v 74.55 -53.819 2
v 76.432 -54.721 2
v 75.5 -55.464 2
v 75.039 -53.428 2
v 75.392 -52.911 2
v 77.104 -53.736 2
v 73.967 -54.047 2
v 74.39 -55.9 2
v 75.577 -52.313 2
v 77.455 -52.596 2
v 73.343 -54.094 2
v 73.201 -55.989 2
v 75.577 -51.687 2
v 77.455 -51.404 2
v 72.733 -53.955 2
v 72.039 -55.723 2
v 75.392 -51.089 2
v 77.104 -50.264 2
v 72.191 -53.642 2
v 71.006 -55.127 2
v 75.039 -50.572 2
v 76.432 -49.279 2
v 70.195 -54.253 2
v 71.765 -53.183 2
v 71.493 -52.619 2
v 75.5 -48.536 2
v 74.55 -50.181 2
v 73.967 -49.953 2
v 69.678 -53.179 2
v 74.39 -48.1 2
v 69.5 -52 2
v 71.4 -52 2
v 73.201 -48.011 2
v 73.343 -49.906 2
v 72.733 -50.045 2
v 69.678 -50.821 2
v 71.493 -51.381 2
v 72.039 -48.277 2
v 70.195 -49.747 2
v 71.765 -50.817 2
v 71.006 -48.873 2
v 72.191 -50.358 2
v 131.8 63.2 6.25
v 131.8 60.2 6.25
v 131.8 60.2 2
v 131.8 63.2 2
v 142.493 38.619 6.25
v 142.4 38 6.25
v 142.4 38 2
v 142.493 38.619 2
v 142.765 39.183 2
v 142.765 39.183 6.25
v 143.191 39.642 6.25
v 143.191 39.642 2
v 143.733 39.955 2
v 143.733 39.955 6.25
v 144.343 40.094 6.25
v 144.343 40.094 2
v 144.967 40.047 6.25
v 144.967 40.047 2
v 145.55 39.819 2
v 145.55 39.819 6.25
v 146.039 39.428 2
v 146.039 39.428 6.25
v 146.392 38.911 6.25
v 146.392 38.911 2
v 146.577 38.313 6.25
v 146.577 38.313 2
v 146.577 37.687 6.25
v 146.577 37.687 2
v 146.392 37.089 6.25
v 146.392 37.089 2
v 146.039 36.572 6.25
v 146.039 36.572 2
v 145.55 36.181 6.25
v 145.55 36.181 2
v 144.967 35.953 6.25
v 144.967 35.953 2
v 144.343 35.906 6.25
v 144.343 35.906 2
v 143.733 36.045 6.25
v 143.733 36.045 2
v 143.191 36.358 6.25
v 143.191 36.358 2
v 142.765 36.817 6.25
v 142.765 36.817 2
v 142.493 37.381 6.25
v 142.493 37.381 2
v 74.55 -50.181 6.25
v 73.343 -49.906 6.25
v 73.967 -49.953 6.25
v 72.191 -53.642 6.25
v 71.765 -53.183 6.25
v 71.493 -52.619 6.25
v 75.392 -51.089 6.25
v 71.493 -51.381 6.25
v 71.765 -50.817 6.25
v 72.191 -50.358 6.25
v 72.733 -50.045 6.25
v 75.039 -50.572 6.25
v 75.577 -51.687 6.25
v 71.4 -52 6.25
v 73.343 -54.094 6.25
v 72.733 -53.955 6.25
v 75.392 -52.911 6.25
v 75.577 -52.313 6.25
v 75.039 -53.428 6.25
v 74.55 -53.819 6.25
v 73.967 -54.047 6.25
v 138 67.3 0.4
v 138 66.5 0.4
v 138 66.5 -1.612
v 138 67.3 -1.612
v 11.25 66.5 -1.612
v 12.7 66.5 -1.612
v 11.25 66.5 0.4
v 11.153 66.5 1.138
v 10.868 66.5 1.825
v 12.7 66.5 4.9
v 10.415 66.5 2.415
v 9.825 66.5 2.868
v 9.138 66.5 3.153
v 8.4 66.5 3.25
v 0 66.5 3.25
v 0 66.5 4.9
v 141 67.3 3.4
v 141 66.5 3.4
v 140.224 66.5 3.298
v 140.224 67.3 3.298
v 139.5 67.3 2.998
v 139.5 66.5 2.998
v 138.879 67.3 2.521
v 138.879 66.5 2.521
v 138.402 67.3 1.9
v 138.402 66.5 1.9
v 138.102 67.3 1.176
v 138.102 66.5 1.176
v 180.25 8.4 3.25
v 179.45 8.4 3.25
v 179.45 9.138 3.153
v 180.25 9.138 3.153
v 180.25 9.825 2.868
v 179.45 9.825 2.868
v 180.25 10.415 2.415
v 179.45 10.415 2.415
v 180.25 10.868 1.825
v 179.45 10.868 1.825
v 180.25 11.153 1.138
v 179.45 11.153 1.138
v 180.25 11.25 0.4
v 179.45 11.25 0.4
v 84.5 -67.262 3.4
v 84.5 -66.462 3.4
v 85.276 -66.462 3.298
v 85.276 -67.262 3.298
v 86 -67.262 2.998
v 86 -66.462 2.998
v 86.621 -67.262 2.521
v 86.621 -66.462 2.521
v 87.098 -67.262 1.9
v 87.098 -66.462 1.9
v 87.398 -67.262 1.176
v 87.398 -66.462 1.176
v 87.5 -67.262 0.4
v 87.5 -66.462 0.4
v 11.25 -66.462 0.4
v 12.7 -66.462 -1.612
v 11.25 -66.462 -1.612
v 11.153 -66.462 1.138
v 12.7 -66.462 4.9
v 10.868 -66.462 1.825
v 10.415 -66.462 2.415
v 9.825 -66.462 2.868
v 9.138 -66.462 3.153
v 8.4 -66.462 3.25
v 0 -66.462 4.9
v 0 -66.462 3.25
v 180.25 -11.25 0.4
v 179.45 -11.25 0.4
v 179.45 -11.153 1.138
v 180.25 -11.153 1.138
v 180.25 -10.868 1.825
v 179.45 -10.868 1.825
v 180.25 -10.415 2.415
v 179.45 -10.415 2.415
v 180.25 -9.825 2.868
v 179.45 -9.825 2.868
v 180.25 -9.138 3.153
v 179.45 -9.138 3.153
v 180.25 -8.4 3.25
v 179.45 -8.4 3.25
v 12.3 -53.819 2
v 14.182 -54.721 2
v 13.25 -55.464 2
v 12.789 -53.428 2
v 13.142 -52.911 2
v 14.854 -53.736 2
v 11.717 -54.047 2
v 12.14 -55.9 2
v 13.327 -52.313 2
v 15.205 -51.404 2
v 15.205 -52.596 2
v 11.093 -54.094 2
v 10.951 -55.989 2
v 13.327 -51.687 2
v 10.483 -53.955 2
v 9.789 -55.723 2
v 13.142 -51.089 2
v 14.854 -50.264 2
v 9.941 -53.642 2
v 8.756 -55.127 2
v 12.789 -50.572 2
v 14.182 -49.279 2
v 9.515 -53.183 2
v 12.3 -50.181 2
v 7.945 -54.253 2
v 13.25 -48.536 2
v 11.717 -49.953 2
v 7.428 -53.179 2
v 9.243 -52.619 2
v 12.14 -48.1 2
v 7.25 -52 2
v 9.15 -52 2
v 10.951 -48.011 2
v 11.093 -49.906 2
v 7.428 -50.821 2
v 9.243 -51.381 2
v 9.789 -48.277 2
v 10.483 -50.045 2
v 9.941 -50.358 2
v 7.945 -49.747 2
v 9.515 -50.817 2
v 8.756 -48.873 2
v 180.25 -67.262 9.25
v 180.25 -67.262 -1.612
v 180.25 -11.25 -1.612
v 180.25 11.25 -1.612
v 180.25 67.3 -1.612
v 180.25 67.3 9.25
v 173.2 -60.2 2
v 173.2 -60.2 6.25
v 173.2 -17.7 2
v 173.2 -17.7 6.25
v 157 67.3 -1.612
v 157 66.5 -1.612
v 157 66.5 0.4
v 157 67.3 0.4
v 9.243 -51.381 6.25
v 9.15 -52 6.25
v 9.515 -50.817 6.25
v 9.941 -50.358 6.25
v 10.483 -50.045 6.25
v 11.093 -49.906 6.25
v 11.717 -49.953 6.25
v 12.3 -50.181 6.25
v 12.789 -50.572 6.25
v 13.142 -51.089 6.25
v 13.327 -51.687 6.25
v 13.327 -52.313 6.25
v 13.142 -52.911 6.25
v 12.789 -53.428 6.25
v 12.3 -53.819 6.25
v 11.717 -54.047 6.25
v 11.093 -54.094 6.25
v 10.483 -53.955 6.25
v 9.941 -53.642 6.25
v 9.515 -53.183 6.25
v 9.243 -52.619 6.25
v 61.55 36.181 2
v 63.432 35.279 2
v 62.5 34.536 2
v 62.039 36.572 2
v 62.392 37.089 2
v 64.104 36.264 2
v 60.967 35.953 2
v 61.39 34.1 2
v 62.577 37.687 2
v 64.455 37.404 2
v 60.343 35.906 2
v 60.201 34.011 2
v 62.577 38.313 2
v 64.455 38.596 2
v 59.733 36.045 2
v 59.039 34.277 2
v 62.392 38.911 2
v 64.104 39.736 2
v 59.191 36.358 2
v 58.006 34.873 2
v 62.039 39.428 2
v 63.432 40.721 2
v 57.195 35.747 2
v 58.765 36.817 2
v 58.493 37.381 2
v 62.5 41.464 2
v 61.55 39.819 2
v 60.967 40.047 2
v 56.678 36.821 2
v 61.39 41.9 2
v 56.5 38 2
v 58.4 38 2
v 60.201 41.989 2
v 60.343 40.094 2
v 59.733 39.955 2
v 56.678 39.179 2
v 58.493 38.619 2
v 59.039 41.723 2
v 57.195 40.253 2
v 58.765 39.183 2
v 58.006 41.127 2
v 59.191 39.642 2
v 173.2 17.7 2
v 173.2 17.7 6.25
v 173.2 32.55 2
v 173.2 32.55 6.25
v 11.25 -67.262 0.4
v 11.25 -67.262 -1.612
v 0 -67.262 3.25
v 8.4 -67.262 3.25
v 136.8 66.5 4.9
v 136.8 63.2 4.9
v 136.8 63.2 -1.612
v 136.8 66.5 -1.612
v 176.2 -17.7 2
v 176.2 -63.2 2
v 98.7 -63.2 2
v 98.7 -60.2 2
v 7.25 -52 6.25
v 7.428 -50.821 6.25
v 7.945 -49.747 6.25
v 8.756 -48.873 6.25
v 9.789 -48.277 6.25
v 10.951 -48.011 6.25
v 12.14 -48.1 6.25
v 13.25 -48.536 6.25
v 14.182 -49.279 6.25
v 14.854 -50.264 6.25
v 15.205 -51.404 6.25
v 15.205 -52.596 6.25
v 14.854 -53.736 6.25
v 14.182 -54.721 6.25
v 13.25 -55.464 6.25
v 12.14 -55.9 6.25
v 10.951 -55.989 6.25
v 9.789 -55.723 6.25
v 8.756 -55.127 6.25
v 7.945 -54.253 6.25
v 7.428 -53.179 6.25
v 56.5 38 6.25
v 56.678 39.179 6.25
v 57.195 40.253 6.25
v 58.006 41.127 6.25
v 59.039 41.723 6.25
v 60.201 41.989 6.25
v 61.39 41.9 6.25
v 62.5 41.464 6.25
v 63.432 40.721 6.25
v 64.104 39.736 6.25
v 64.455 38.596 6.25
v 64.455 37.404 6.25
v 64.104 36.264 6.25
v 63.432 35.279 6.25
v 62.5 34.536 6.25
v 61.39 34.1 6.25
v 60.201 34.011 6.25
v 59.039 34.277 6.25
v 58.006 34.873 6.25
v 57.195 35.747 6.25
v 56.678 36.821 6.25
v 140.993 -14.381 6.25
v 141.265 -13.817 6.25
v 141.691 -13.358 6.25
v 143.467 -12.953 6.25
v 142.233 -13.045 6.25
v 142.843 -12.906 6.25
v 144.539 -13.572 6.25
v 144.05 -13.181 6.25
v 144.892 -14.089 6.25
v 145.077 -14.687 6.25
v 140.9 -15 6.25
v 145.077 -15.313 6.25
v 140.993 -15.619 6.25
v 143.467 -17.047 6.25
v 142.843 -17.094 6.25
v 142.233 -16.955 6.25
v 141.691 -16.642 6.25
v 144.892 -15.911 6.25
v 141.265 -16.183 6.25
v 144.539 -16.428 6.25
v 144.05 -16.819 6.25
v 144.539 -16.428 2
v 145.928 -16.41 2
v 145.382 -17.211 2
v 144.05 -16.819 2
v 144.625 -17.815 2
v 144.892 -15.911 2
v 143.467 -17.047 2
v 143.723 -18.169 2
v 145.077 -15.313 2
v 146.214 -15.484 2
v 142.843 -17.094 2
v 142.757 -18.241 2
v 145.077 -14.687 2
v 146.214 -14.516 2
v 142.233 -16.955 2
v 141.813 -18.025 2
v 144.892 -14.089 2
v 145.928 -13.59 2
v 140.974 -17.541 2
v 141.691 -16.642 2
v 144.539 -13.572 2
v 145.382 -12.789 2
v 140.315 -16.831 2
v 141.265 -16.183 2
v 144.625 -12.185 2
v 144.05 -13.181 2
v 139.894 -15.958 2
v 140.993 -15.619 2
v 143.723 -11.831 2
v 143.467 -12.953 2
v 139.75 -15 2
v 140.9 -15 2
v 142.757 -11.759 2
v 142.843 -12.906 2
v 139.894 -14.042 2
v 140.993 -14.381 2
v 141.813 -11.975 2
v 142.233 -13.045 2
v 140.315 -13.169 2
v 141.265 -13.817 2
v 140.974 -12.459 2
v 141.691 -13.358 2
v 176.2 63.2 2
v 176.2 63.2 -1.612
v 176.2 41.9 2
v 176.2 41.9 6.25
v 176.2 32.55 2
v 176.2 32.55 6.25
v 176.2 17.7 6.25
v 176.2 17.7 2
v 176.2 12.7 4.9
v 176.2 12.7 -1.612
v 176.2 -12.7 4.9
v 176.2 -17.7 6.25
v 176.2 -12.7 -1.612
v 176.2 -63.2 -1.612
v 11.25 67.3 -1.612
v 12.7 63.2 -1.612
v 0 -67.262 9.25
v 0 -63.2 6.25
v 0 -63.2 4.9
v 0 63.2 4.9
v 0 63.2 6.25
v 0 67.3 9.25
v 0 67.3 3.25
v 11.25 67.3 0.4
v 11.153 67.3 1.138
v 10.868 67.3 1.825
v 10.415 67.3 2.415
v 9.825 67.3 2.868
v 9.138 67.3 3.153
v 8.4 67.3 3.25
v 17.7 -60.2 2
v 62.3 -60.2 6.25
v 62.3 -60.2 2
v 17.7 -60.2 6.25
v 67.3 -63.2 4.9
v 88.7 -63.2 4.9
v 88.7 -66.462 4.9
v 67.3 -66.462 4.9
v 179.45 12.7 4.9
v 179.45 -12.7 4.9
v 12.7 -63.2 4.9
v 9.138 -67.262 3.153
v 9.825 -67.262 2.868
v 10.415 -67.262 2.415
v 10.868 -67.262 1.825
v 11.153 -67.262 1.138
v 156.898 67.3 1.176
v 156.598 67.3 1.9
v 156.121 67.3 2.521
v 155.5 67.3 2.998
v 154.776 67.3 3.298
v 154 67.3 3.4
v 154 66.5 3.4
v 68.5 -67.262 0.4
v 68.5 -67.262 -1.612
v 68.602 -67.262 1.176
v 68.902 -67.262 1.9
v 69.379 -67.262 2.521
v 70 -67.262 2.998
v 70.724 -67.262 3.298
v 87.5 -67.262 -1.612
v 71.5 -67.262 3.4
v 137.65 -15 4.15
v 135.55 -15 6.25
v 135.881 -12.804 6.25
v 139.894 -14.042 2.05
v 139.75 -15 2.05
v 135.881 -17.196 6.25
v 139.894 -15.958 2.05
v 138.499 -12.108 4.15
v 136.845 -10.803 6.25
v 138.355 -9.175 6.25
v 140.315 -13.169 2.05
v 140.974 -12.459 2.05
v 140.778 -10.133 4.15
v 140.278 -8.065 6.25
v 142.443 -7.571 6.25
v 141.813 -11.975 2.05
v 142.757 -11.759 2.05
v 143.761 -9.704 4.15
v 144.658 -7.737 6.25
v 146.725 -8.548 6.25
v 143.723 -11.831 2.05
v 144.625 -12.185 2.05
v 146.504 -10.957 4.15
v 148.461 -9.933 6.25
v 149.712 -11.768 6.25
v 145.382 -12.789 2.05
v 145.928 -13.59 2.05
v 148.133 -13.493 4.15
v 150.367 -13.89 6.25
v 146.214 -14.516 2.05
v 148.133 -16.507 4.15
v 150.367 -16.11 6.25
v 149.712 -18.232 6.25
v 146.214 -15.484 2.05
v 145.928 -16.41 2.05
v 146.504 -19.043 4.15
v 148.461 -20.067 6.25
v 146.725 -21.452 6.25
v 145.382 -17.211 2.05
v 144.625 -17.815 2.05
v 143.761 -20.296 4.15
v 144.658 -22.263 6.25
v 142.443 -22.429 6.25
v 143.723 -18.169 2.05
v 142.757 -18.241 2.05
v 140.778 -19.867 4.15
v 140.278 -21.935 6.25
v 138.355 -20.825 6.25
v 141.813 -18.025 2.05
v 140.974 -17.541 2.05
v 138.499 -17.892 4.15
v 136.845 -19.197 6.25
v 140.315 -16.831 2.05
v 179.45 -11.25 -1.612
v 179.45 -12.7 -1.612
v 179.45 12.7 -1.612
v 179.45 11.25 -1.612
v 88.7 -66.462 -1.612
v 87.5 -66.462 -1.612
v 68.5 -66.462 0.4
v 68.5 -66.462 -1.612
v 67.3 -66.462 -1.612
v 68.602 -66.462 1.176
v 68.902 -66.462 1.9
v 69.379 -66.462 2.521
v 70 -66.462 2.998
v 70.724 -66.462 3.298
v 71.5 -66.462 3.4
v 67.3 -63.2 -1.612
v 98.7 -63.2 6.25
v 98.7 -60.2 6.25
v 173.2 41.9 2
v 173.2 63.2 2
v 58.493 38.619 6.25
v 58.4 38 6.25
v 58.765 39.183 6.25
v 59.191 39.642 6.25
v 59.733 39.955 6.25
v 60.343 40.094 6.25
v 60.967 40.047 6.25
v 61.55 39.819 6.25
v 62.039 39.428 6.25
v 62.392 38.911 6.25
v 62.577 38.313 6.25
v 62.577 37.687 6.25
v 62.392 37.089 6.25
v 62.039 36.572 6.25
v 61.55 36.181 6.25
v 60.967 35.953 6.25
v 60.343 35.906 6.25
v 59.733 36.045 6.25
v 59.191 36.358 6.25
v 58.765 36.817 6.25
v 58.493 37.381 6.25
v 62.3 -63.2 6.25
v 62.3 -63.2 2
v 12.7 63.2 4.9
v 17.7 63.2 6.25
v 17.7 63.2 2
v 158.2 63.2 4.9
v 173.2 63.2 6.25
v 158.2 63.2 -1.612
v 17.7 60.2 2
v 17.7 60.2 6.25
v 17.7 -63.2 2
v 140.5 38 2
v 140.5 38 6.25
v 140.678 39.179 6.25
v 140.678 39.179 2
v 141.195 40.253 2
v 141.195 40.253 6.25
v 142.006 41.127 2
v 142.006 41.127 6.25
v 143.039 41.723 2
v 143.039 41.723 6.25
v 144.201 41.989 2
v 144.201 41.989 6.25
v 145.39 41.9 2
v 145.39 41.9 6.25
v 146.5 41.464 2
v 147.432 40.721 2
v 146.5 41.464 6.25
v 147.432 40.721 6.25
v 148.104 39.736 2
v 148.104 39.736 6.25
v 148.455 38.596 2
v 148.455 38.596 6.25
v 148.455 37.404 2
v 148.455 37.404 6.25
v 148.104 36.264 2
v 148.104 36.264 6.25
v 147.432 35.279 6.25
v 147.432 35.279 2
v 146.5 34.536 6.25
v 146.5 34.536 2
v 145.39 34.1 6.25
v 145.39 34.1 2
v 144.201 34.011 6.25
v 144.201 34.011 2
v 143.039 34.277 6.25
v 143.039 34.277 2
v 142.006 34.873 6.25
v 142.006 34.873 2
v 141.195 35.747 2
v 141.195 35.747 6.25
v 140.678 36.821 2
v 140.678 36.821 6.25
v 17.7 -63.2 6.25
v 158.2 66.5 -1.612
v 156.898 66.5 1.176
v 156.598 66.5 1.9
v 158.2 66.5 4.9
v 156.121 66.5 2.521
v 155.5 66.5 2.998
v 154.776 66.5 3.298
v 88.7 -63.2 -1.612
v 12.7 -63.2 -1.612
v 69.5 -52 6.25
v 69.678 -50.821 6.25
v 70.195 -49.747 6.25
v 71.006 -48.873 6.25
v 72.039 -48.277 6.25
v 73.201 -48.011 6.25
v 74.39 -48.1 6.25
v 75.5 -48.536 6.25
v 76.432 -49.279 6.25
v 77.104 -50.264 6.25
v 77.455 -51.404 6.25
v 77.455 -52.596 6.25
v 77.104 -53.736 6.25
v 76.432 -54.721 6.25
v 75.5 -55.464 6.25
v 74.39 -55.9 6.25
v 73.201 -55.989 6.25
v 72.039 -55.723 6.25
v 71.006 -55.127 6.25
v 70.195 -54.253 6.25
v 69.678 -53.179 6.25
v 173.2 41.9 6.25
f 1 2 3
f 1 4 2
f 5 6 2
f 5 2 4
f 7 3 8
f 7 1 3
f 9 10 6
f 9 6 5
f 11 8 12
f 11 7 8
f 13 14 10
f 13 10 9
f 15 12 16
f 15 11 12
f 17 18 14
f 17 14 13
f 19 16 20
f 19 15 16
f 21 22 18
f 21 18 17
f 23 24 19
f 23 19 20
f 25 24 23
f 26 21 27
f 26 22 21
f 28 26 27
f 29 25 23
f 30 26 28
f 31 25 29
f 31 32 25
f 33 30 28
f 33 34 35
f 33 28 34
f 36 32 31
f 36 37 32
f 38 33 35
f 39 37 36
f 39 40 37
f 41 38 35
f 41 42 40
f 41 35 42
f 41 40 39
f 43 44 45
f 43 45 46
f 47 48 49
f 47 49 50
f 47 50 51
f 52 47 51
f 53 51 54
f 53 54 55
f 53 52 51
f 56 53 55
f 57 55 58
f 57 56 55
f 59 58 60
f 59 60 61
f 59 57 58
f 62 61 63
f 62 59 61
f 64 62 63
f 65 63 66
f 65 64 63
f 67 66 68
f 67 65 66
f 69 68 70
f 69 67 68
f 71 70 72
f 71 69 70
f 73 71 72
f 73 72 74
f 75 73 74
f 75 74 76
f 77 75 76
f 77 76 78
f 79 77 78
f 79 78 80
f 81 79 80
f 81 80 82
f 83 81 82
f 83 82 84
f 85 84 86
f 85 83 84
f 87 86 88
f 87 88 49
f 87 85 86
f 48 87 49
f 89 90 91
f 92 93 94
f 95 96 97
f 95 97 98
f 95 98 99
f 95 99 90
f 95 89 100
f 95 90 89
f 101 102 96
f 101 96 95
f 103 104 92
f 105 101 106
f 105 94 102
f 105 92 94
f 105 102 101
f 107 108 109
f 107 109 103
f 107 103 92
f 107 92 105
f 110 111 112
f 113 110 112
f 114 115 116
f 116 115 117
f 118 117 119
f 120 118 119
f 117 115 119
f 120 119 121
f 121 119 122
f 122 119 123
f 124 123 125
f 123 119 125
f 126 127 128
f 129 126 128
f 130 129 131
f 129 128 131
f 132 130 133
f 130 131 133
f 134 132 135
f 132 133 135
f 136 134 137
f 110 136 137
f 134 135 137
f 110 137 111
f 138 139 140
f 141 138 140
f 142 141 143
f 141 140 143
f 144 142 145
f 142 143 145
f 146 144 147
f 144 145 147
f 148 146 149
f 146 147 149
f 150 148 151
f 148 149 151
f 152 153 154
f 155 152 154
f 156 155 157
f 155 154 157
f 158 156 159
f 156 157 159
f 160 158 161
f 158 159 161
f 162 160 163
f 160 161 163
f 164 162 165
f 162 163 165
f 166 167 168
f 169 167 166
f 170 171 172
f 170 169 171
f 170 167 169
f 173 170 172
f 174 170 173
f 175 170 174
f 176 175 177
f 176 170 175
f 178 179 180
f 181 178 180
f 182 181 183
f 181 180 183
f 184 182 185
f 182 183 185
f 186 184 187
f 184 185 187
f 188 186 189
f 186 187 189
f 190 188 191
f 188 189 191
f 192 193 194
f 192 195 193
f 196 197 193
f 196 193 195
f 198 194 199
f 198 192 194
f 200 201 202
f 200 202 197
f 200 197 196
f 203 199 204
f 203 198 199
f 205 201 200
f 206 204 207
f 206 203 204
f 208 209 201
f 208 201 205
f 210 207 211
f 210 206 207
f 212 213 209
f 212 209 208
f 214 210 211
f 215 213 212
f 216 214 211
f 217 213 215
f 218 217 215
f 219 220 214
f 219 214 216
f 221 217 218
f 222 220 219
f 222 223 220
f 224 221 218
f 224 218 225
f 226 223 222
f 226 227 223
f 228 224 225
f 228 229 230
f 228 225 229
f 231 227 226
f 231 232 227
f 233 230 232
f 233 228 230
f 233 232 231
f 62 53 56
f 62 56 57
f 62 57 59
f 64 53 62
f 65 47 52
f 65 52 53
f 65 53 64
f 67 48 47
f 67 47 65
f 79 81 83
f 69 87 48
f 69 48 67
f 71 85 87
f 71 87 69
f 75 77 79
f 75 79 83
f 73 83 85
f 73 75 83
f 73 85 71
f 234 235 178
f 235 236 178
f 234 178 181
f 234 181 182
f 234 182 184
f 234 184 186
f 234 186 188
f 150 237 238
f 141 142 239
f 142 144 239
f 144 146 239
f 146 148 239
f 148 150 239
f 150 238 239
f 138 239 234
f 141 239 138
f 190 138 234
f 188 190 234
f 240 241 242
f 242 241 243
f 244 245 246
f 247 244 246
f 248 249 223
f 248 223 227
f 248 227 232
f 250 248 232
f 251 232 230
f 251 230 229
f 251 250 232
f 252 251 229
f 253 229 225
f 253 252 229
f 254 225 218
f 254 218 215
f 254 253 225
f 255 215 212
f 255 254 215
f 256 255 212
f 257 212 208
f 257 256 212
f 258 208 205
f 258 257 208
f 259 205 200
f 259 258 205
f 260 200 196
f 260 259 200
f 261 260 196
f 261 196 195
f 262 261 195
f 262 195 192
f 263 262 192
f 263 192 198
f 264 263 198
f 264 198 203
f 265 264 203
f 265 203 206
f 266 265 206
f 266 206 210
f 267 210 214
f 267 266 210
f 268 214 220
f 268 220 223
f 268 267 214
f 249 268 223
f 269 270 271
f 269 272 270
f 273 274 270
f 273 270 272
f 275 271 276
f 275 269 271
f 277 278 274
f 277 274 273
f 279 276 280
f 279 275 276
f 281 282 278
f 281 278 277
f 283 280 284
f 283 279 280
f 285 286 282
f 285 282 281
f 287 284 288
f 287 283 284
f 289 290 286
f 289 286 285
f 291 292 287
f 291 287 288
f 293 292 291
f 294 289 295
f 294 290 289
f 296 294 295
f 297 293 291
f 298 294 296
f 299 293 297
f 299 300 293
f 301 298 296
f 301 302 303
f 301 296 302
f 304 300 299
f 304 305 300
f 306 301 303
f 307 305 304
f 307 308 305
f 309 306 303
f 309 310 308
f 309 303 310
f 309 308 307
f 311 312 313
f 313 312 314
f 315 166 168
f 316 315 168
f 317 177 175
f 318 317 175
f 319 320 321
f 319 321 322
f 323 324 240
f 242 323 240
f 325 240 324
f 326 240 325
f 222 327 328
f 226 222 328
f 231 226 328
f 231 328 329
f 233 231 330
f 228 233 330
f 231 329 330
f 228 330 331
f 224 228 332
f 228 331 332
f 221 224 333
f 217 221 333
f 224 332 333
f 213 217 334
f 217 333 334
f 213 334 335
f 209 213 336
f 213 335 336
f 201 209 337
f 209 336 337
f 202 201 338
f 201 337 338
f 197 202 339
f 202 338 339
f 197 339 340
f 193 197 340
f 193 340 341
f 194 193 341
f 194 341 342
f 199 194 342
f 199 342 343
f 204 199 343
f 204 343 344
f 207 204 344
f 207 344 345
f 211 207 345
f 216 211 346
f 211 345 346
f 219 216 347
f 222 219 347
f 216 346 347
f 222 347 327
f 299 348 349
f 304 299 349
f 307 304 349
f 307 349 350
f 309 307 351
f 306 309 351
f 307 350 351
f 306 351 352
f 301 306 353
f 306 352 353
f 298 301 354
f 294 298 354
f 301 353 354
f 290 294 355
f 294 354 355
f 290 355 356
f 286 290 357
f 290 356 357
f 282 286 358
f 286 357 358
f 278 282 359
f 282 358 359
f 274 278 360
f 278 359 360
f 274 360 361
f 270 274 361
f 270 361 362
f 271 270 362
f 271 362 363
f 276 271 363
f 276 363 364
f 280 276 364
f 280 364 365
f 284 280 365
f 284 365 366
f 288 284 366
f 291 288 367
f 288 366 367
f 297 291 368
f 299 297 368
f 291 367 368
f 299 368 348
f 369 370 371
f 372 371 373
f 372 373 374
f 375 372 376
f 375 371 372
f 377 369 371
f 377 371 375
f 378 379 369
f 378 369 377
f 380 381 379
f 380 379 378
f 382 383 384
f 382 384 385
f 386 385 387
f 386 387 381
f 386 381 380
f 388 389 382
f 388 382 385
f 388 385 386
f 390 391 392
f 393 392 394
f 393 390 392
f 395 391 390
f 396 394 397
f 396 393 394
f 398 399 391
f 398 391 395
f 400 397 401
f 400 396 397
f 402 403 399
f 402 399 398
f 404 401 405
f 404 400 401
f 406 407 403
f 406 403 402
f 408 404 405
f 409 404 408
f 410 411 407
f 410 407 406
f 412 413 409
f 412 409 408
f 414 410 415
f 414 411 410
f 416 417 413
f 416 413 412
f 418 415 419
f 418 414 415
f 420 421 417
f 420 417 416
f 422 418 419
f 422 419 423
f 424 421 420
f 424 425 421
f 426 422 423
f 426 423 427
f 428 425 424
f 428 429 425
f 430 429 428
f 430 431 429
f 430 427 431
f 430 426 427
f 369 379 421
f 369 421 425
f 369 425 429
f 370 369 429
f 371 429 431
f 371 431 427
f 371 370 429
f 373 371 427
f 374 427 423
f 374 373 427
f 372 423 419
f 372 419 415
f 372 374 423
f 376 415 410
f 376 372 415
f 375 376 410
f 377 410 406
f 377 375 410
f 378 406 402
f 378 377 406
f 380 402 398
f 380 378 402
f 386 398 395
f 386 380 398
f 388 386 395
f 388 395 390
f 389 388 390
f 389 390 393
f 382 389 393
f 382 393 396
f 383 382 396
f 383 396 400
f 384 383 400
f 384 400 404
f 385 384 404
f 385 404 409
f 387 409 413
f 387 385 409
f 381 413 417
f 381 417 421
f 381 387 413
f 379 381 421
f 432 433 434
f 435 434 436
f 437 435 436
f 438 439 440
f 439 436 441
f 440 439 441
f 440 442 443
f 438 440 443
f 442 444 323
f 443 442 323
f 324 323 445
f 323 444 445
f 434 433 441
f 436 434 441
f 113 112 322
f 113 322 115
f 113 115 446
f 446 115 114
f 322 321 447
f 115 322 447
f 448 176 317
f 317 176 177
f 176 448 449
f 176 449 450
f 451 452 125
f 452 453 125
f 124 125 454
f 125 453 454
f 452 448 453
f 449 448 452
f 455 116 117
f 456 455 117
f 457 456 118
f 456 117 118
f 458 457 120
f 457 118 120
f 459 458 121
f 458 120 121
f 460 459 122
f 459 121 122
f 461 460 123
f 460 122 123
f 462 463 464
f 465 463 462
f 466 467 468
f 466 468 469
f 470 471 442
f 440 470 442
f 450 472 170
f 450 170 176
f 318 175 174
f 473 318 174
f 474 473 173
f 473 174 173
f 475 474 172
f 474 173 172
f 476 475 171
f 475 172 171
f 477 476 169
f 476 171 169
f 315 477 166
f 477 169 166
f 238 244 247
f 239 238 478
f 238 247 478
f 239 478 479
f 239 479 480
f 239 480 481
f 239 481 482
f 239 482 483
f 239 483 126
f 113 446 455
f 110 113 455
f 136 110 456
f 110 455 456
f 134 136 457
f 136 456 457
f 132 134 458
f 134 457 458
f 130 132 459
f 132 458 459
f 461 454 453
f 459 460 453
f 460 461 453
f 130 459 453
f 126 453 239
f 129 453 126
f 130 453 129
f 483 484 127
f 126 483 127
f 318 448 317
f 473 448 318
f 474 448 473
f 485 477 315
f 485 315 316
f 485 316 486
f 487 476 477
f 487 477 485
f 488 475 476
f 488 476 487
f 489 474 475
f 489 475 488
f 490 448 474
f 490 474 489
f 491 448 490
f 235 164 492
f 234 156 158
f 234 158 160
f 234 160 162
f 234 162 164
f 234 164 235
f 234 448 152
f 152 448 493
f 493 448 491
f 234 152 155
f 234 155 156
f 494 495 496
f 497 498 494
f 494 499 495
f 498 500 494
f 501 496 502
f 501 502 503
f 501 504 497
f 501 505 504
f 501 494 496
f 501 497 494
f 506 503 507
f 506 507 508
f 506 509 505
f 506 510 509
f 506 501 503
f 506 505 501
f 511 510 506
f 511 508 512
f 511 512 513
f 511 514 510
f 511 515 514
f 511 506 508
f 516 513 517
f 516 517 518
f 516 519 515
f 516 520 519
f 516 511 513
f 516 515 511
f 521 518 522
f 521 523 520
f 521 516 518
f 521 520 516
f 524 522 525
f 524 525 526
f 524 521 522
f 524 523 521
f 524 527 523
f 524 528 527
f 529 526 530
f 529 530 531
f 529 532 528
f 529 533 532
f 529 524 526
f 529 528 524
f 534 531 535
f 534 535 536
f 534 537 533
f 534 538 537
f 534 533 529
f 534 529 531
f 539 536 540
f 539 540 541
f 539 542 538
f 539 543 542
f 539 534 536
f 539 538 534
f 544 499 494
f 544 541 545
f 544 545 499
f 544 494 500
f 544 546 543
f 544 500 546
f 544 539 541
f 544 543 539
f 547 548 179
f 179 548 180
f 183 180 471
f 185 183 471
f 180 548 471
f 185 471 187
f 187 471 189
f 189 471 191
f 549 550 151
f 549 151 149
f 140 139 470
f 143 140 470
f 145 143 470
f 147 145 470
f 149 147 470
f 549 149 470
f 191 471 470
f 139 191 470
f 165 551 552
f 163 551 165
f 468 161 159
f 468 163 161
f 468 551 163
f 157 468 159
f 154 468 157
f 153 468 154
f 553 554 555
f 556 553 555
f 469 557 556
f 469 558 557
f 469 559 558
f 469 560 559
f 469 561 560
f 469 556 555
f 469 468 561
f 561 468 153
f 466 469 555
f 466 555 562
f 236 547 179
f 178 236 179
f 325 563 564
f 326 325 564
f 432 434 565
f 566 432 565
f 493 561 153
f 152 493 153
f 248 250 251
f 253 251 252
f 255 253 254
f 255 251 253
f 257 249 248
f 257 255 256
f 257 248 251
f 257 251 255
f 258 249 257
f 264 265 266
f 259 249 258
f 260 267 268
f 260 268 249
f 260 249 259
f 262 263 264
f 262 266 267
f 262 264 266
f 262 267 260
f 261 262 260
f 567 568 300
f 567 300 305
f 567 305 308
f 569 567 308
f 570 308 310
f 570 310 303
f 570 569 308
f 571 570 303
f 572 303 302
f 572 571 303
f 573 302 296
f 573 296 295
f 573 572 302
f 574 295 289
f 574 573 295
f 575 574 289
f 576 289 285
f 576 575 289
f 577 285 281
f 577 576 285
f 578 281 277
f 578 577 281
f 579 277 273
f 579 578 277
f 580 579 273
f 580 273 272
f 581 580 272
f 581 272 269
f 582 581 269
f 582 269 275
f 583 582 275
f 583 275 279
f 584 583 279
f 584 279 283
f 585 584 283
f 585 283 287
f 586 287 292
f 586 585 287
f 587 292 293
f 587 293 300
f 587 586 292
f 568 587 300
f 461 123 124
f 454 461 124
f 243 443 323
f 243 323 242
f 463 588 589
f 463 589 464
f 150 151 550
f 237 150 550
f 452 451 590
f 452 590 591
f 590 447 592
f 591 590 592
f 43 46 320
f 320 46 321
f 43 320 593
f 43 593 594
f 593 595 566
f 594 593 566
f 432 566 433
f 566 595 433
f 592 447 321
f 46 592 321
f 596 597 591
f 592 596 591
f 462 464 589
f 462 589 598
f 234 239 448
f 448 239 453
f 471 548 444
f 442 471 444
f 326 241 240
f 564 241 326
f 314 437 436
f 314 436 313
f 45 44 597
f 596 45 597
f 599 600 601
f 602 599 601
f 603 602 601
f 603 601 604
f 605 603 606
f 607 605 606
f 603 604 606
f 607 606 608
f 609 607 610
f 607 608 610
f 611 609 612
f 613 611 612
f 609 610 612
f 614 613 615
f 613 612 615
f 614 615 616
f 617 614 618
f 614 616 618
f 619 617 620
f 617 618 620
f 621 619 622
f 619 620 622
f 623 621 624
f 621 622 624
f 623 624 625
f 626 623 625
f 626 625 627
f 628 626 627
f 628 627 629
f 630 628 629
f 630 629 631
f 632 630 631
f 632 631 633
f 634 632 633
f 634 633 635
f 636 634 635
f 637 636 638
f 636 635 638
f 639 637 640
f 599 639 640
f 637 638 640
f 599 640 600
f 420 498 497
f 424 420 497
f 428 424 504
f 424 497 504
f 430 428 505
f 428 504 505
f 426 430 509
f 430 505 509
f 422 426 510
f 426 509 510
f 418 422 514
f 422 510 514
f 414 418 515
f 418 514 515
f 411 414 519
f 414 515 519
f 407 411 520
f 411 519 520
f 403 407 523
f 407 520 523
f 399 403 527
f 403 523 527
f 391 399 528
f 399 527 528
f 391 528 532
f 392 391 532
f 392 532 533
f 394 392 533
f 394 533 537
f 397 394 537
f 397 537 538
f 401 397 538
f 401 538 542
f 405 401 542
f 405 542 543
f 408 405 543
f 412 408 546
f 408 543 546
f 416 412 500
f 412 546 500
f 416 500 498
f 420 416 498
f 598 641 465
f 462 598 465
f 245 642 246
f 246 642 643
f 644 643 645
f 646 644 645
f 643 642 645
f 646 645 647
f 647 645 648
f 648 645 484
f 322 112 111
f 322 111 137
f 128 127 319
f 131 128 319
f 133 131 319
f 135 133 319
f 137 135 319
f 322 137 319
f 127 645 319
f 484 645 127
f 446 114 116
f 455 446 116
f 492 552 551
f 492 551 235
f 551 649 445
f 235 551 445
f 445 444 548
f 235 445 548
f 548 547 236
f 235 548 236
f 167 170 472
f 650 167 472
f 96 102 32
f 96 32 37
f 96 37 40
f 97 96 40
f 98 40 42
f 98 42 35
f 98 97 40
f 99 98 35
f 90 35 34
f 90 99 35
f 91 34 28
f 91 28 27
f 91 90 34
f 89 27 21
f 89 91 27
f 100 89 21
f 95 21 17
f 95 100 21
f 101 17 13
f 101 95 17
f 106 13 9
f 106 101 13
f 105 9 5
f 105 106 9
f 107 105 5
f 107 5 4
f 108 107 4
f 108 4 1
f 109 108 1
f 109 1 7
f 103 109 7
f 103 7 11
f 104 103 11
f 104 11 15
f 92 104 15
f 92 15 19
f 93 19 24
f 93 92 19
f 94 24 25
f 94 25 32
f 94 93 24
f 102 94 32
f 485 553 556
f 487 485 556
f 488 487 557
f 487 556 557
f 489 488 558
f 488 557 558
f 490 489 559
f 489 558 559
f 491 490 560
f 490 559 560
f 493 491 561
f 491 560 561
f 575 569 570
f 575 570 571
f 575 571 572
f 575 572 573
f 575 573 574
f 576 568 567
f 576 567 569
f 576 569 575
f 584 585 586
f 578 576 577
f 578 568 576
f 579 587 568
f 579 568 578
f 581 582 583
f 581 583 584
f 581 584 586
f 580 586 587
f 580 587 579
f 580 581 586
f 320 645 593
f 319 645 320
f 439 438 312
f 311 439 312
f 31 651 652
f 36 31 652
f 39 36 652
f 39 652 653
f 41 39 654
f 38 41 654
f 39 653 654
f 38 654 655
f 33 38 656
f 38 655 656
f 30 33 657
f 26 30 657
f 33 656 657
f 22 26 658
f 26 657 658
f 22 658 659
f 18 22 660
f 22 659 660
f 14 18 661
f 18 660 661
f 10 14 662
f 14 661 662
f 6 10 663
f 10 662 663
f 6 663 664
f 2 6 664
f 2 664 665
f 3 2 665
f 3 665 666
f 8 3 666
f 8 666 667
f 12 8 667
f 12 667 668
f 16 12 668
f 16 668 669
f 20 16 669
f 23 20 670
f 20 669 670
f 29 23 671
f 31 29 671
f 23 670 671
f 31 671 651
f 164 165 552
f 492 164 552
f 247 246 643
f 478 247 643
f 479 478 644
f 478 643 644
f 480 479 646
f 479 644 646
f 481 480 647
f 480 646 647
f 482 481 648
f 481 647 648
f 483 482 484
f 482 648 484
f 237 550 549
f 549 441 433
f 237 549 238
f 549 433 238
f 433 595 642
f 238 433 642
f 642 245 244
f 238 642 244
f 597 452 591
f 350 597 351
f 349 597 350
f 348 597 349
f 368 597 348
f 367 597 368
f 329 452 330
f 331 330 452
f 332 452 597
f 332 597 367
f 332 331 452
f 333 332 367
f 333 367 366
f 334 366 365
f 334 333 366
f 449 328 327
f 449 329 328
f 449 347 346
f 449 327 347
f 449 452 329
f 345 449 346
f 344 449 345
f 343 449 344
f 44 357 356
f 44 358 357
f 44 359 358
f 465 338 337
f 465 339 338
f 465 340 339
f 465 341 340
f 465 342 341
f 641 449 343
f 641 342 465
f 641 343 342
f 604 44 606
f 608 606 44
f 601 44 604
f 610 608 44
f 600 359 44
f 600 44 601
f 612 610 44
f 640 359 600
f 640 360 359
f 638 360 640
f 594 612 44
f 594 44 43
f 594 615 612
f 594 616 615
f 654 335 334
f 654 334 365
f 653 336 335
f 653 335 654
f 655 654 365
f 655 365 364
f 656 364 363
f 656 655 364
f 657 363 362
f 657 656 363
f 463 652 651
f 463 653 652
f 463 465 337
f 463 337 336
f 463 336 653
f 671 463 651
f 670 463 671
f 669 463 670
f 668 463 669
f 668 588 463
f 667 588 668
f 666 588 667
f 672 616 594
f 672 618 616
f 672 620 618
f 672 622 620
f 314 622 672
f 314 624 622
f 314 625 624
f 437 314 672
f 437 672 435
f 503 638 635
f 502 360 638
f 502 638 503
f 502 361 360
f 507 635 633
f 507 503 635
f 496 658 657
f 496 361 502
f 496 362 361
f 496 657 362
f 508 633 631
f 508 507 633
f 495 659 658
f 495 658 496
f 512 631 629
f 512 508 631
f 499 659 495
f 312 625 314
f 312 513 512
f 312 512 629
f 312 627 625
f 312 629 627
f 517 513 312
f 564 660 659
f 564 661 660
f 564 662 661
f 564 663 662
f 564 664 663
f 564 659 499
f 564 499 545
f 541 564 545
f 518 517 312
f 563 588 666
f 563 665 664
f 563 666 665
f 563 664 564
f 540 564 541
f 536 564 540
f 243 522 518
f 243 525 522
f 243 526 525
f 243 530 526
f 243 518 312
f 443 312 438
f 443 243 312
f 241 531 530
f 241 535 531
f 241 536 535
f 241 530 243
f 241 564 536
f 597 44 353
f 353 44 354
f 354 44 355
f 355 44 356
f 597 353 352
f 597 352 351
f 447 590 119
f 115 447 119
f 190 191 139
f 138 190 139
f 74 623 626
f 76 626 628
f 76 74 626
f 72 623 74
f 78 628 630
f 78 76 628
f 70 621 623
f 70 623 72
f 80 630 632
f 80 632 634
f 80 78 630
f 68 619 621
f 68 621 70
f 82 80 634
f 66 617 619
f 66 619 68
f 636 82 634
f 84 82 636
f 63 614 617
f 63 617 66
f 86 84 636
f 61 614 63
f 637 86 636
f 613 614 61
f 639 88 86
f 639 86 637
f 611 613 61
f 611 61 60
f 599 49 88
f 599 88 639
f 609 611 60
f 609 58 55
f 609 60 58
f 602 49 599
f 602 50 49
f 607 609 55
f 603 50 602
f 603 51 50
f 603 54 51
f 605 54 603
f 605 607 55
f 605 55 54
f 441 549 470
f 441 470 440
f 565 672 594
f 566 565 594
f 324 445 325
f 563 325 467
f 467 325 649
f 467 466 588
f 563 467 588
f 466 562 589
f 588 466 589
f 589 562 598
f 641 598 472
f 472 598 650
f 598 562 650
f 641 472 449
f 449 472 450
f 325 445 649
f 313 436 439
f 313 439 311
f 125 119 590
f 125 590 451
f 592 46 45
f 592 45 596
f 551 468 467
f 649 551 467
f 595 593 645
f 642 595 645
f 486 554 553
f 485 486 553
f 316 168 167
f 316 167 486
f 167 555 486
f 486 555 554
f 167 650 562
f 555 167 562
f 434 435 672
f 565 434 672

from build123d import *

# Parameters (mm, degrees)
BOSS_EXTRUDE1_START  = 3.25
SKETCH1_W            = 176
SKETCH1_H            = 126
BOSS_EXTRUDE1_DEPTH  = 6
CUT_EXTRUDE1_START   = 3.25
SKETCH1_2_W          = 176
SKETCH1_2_H          = 126
CUT_EXTRUDE1_DEPTH   = 3
BOSS_EXTRUDE2_DEPTH  = 2.6
BOSS_EXTRUDE3_DEPTH  = 0.7
BOSS_EXTRUDE4_START  = 3.3
BOSS_EXTRUDE4_DEPTH  = 1
BOSS_EXTRUDE5_DEPTH  = 2.55
BOSS_EXTRUDE6_DEPTH  = 0.7
BOSS_EXTRUDE7_START  = 3.25
BOSS_EXTRUDE7_DEPTH  = 1
BOSS_EXTRUDE8_START  = 2.5625
BOSS_EXTRUDE8_DEPTH  = 2.5625
BOSS_EXTRUDE9_START  = 0.7
BOSS_EXTRUDE9_DEPTH  = 0.7
BOSS_EXTRUDE10_START = 3.2625
BOSS_EXTRUDE10_DEPTH = 1
CUT_EXTRUDE2_START   = -6.5116
SKETCH8_W            = 21.4
SKETCH8_H            = 3.5
SKETCH8_W_2          = 12.7
SKETCH8_W_3          = 3.45
SKETCH8_H_2          = 25.4
SKETCH8_H_3          = 3.4625
CUT_EXTRUDE2_DEPTH   = 6.5116
CUT_EXTRUDE3_REACH   = 194.71
SKETCH9_W            = 176
SKETCH9_H            = 0.2
SKETCH10_R           = 4
SKETCH10_R_2         = 2.1
SKETCH10_R_3         = 3.25
BOSS_EXTRUDE11_DEPTH = 4.25
SKETCH11_W           = 114.1
SKETCH11_H           = 3
SKETCH11_W_2         = 3
SKETCH11_H_2         = 21.3
SKETCH11_H_3         = 14.85
SKETCH11_H_4         = 42.5
SKETCH11_W_3         = 74.5
SKETCH11_W_4         = 44.6
BOSS_EXTRUDE12_DEPTH = 4.25
CHAMFER1_SIZE        = 4.2


with BuildPart() as part:
    # Sketch1 → Boss-Extrude1 (new body)
    with BuildSketch(Plane.XY.offset(BOSS_EXTRUDE1_START)):
        with Locations((88, 0)):
            Rectangle(SKETCH1_W, SKETCH1_H)
    extrude(amount=BOSS_EXTRUDE1_DEPTH)

    # Sketch1<2> → Cut-Extrude1 (cut)
    with BuildSketch(Plane.XY.offset(CUT_EXTRUDE1_START)):
        with Locations((88, 0)):
            Rectangle(SKETCH1_2_W, SKETCH1_2_H)
    extrude(amount=CUT_EXTRUDE1_DEPTH, mode=Mode.SUBTRACT)

    # Sketch2 → Boss-Extrude2 (add)
    with BuildSketch(Plane(origin=(0, 63, 0), x_dir=(1, 0, 0), z_dir=(0, 1, 0))):
        with BuildLine():
            Line((0, -3.25), (0, -9.25))
            Line((0, -9.25), (176, -9.25))
            Line((176, -9.25), (176, 1.6116))
            Line((176, 1.6116), (157, 1.6116))
            Line((157, 1.6116), (157, -0.4))
            ThreePointArc((157, -0.4), (156.121320344, -2.521320344), (154, -3.4))
            Line((154, -3.4), (141, -3.4))
            ThreePointArc((141, -3.4), (138.878679656, -2.521320344), (138, -0.4))
            Line((138, -0.4), (138, 1.6116))
            Line((138, 1.6116), (11.25, 1.6116))
            Line((11.25, 1.6116), (11.25, -0.4))
            ThreePointArc((11.25, -0.4), (10.415254326, -2.415254326), (8.4, -3.25))
            Line((8.4, -3.25), (0, -3.25))
        make_face()
    extrude(amount=BOSS_EXTRUDE2_DEPTH)

    # Sketch3 → Boss-Extrude3 (add)
    with BuildSketch(Plane(origin=(0, 65.6, 0), x_dir=(1, 0, 0), z_dir=(0, 1, 0))):
        with BuildLine():
            Line((0, -4.4), (0, -9.25))
            Line((0, -9.25), (176, -9.25))
            Line((176, -9.25), (176, 1.6116))
            Line((176, 1.6116), (157.457378406, 1.6116))
            ThreePointArc((157.457378406, 1.6116), (157.46744863, -2.394191566), (154, -4.4))
            Line((154, -4.4), (141, -4.4))
            ThreePointArc((141, -4.4), (137.53255137, -2.394191566), (137.542621594, 1.6116))
            Line((137.542621594, 1.6116), (11.957378406, 1.6116))
            ThreePointArc((11.957378406, 1.6116), (11.96744863, -2.394191566), (8.5, -4.4))
            Line((8.5, -4.4), (0, -4.4))
        make_face()
    extrude(amount=BOSS_EXTRUDE3_DEPTH)

    # Sketch2<3> → Boss-Extrude4 (add)
    with BuildSketch(Plane(origin=(0, 63, 0), x_dir=(1, 0, 0), z_dir=(0, 1, 0)).offset(BOSS_EXTRUDE4_START)):
        with BuildLine():
            Line((0, -3.25), (0, -9.25))
            Line((0, -9.25), (176, -9.25))
            Line((176, -9.25), (176, 1.6116))
            Line((176, 1.6116), (157, 1.6116))
            Line((157, 1.6116), (157, -0.4))
            ThreePointArc((157, -0.4), (156.121320344, -2.521320344), (154, -3.4))
            Line((154, -3.4), (141, -3.4))
            ThreePointArc((141, -3.4), (138.878679656, -2.521320344), (138, -0.4))
            Line((138, -0.4), (138, 1.6116))
            Line((138, 1.6116), (11.25, 1.6116))
            Line((11.25, 1.6116), (11.25, -0.4))
            ThreePointArc((11.25, -0.4), (10.415254326, -2.415254326), (8.4, -3.25))
            Line((8.4, -3.25), (0, -3.25))
        make_face()
    extrude(amount=BOSS_EXTRUDE4_DEPTH)

    # Sketch4 → Boss-Extrude5 (add)
    with BuildSketch(Plane(origin=(176, 0, 0), x_dir=(0, 0, -1), z_dir=(1, 0, 0))):
        with BuildLine():
            Line((1.6116, 67.3), (-9.25, 67.3))
            Line((-9.25, 67.3), (-9.25, -63))
            Line((-9.25, -63), (1.6116, -63))
            Line((1.6116, -63), (1.6116, -11.25))
            Line((1.6116, -11.25), (-0.4, -11.25))
            ThreePointArc((-0.4, -11.25), (-2.415254326, -10.415254326), (-3.25, -8.4))
            Line((-3.25, -8.4), (-3.25, 8.4))
            ThreePointArc((-3.25, 8.4), (-2.415254326, 10.415254326), (-0.4, 11.25))
            Line((-0.4, 11.25), (1.6116, 11.25))
            Line((1.6116, 11.25), (1.6116, 67.3))
        make_face()
    extrude(amount=BOSS_EXTRUDE5_DEPTH)

    # Sketch5 → Boss-Extrude6 (add)
    with BuildSketch(Plane(origin=(178.55, 0, 0), x_dir=(0, 0, -1), z_dir=(1, 0, 0))):
        with BuildLine():
            Line((1.6116, 11.957378406), (1.6116, 67.3))
            Line((1.6116, 67.3), (-9.25, 67.3))
            Line((-9.25, 67.3), (-9.25, -63))
            Line((-9.25, -63), (1.6116, -63))
            Line((1.6116, -63), (1.6116, -11.957378406))
            ThreePointArc((1.6116, -11.957378406), (-2.394191566, -11.96744863), (-4.4, -8.5))
            Line((-4.4, -8.5), (-4.4, 8.5))
            ThreePointArc((-4.4, 8.5), (-2.394191566, 11.96744863), (1.6116, 11.957378406))
        make_face()
    extrude(amount=BOSS_EXTRUDE6_DEPTH)

    # Sketch4<3> → Boss-Extrude7 (add)
    with BuildSketch(Plane(origin=(176, 0, 0), x_dir=(0, 0, -1), z_dir=(1, 0, 0)).offset(BOSS_EXTRUDE7_START)):
        with BuildLine():
            Line((1.6116, 67.3), (-9.25, 67.3))
            Line((-9.25, 67.3), (-9.25, -63))
            Line((-9.25, -63), (1.6116, -63))
            Line((1.6116, -63), (1.6116, -11.25))
            Line((1.6116, -11.25), (-0.4, -11.25))
            ThreePointArc((-0.4, -11.25), (-2.415254326, -10.415254326), (-3.25, -8.4))
            Line((-3.25, -8.4), (-3.25, 8.4))
            ThreePointArc((-3.25, 8.4), (-2.415254326, 10.415254326), (-0.4, 11.25))
            Line((-0.4, 11.25), (1.6116, 11.25))
            Line((1.6116, 11.25), (1.6116, 67.3))
        make_face()
    extrude(amount=BOSS_EXTRUDE7_DEPTH)

    # Sketch6 → Boss-Extrude8 (add)
    with BuildSketch(Plane.XZ.offset(63).offset(BOSS_EXTRUDE8_START)):
        with BuildLine():
            Line((87.5, -1.6116), (180.25, -1.6116))
            Line((180.25, -1.6116), (180.25, 9.25))
            Line((180.25, 9.25), (0, 9.25))
            Line((0, 9.25), (0, 3.25))
            Line((0, 3.25), (8.4, 3.25))
            ThreePointArc((8.4, 3.25), (10.415254326, 2.415254326), (11.25, 0.4))
            Line((11.25, 0.4), (11.25, -1.6116))
            Line((11.25, -1.6116), (68.5, -1.6116))
            Line((68.5, -1.6116), (68.5, 0.4))
            ThreePointArc((68.5, 0.4), (69.378679656, 2.521320344), (71.5, 3.4))
            Line((71.5, 3.4), (84.5, 3.4))
            ThreePointArc((84.5, 3.4), (86.621320344, 2.521320344), (87.5, 0.4))
            Line((87.5, 0.4), (87.5, -1.6116))
        make_face()
    extrude(amount=-BOSS_EXTRUDE8_DEPTH)

    # Sketch7 → Boss-Extrude9 (add)
    with BuildSketch(Plane.XZ.offset(65.5625).offset(BOSS_EXTRUDE9_START)):
        with BuildLine():
            Line((87.957378406, -1.6116), (180.25, -1.6116))
            Line((180.25, -1.6116), (180.25, 9.25))
            Line((180.25, 9.25), (0, 9.25))
            Line((0, 9.25), (0, 4.4))
            Line((0, 4.4), (8.5, 4.4))
            ThreePointArc((8.5, 4.4), (11.96744863, 2.394191566), (11.957378406, -1.6116))
            Line((11.957378406, -1.6116), (68.042621594, -1.6116))
            ThreePointArc((68.042621594, -1.6116), (68.03255137, 2.394191566), (71.5, 4.4))
            Line((71.5, 4.4), (84.5, 4.4))
            ThreePointArc((84.5, 4.4), (87.96744863, 2.394191566), (87.957378406, -1.6116))
        make_face()
    extrude(amount=-BOSS_EXTRUDE9_DEPTH)

    # Sketch6<4> → Boss-Extrude10 (add)
    with BuildSketch(Plane.XZ.offset(63).offset(BOSS_EXTRUDE10_START)):
        with BuildLine():
            Line((87.5, -1.6116), (180.25, -1.6116))
            Line((180.25, -1.6116), (180.25, 9.25))
            Line((180.25, 9.25), (0, 9.25))
            Line((0, 9.25), (0, 3.25))
            Line((0, 3.25), (8.4, 3.25))
            ThreePointArc((8.4, 3.25), (10.415254326, 2.415254326), (11.25, 0.4))
            Line((11.25, 0.4), (11.25, -1.6116))
            Line((11.25, -1.6116), (68.5, -1.6116))
            Line((68.5, -1.6116), (68.5, 0.4))
            ThreePointArc((68.5, 0.4), (69.378679656, 2.521320344), (71.5, 3.4))
            Line((71.5, 3.4), (84.5, 3.4))
            ThreePointArc((84.5, 3.4), (86.621320344, 2.521320344), (87.5, 0.4))
            Line((87.5, 0.4), (87.5, -1.6116))
        make_face()
    extrude(amount=BOSS_EXTRUDE10_DEPTH)

    # Sketch8 → Cut-Extrude2 (cut)
    with BuildSketch(Plane(origin=(0, 0, -1.6116), x_dir=(-1, 0, 0), z_dir=(0, 0, -1)).offset(CUT_EXTRUDE2_START)):
        with Locations((-147.5, 64.75)):
            Rectangle(SKETCH8_W, SKETCH8_H)
        with Locations((-6.35, 64.75)):
            Rectangle(SKETCH8_W_2, SKETCH8_H)
        with Locations((-177.725, 0)):
            Rectangle(SKETCH8_W_3, SKETCH8_H_2)
        with Locations((-78, -64.73125)):
            Rectangle(SKETCH8_W, SKETCH8_H_3)
        with Locations((-6.35, -64.73125)):
            Rectangle(SKETCH8_W_2, SKETCH8_H_3)
    extrude(amount=CUT_EXTRUDE2_DEPTH, mode=Mode.SUBTRACT)

    # Cut-Extrude3: up to this face of the body (flat: up to its plane)
    cut_extrude3_end = Plane(part.part.faces().sort_by_distance((88, 0, 6.25))[0])
    # Sketch9 → Cut-Extrude3 (cut, up to the picked face)
    with BuildSketch(Plane(origin=(0, 0, -1.6116), x_dir=(-1, 0, 0), z_dir=(0, 0, -1)), mode=Mode.PRIVATE) as cut_extrude3_sk1:
        with Locations((-88, 63.1)):
            Rectangle(SKETCH9_W, SKETCH9_H)
    cut_extrude3_tool1 = split(extrude(cut_extrude3_sk1.sketch, amount=-CUT_EXTRUDE3_REACH, mode=Mode.PRIVATE), bisect_by=cut_extrude3_end, keep=Keep.BOTH, mode=Mode.PRIVATE)
    # Sketch9 → Cut-Extrude3 (cut, up to the picked face)
    with BuildSketch(Plane(origin=(0, 0, -1.6116), x_dir=(-1, 0, 0), z_dir=(0, 0, -1)), mode=Mode.PRIVATE) as cut_extrude3_sk2:
        Polygon((-176, -63), (-176, 63), (-176, 63.2), (-176.2, 63.2), (-176.2, -63), align=None)
    cut_extrude3_tool2 = split(extrude(cut_extrude3_sk2.sketch, amount=-CUT_EXTRUDE3_REACH, mode=Mode.PRIVATE), bisect_by=cut_extrude3_end, keep=Keep.BOTH, mode=Mode.PRIVATE)
    # Sketch9 → Cut-Extrude3 (cut, up to the picked face)
    with BuildSketch(Plane(origin=(0, 0, -1.6116), x_dir=(-1, 0, 0), z_dir=(0, 0, -1)), mode=Mode.PRIVATE) as cut_extrude3_sk3:
        Polygon((0, -63), (-176, -63), (-176.2, -63), (-176.2, -63.2), (0, -63.2), align=None)
    cut_extrude3_tool3 = split(extrude(cut_extrude3_sk3.sketch, amount=-CUT_EXTRUDE3_REACH, mode=Mode.PRIVATE), bisect_by=cut_extrude3_end, keep=Keep.BOTH, mode=Mode.PRIVATE)
    add(cut_extrude3_tool1.solids().sort_by(Axis((88, 63.1, -1.6116), (0, 0, 1)))[0], mode=Mode.SUBTRACT)
    add(cut_extrude3_tool2.solids().sort_by(Axis((176.1, 0.1, -1.6116), (0, 0, 1)))[0], mode=Mode.SUBTRACT)
    add(cut_extrude3_tool3.solids().sort_by(Axis((88.1, -63.1, -1.6116), (0, 0, 1)))[0], mode=Mode.SUBTRACT)

    # Sketch10 → Boss-Extrude11 (add)
    # profile 1 of 5: a face of its own
    with BuildSketch(Plane(origin=(0, 0, 6.25), x_dir=(-1, 0, 0), z_dir=(0, 0, -1))):
        with Locations((-144.5, 38)):
            Circle(SKETCH10_R)
        with Locations((-144.5, 38)):
            Circle(SKETCH10_R_2, mode=Mode.SUBTRACT)
    # profile 2 of 5: a face of its own
    with BuildSketch(Plane(origin=(0, 0, 6.25), x_dir=(-1, 0, 0), z_dir=(0, 0, -1))):
        with Locations((-60.5, 38)):
            Circle(SKETCH10_R)
        with Locations((-60.5, 38)):
            Circle(SKETCH10_R_2, mode=Mode.SUBTRACT)
    # profile 3 of 5: a face of its own
    with BuildSketch(Plane(origin=(0, 0, 6.25), x_dir=(-1, 0, 0), z_dir=(0, 0, -1))):
        with Locations((-73.5, -52)):
            Circle(SKETCH10_R)
        with Locations((-73.5, -52)):
            Circle(SKETCH10_R_2, mode=Mode.SUBTRACT)
    # profile 4 of 5: a face of its own
    with BuildSketch(Plane(origin=(0, 0, 6.25), x_dir=(-1, 0, 0), z_dir=(0, 0, -1))):
        with Locations((-11.25, -52)):
            Circle(SKETCH10_R)
        with Locations((-11.25, -52)):
            Circle(SKETCH10_R_2, mode=Mode.SUBTRACT)
    # profile 5 of 5: a face of its own
    with BuildSketch(Plane(origin=(0, 0, 6.25), x_dir=(-1, 0, 0), z_dir=(0, 0, -1))):
        with Locations((-143, -15)):
            Circle(SKETCH10_R_3)
        with Locations((-143, -15)):
            Circle(SKETCH10_R_2, mode=Mode.SUBTRACT)
    extrude(amount=BOSS_EXTRUDE11_DEPTH)

    # Sketch11 → Boss-Extrude12 (add)
    with BuildSketch(Plane(origin=(0, 0, 6.25), x_dir=(-1, 0, 0), z_dir=(0, 0, -1))):
        with Locations((-74.75, 61.7)):
            Rectangle(SKETCH11_W, SKETCH11_H)
        with Locations((-174.7, 52.55)):
            Rectangle(SKETCH11_W_2, SKETCH11_H_2)
        with Locations((-174.7, 25.125)):
            Rectangle(SKETCH11_W_2, SKETCH11_H_3)
        with Locations((-174.7, -38.95)):
            Rectangle(SKETCH11_W_2, SKETCH11_H_4)
        with Locations((-135.95, -61.7)):
            Rectangle(SKETCH11_W_3, SKETCH11_H)
        with Locations((-174.7, -61.7)):
            Rectangle(SKETCH11_W_2, SKETCH11_H)
        with Locations((-40, -61.7)):
            Rectangle(SKETCH11_W_4, SKETCH11_H)
    extrude(amount=BOSS_EXTRUDE12_DEPTH)

    # Chamfer1
    chamfer1_edges = [part.edges().sort_by_distance(p)[0] for p in [
        (146.25, -15, 6.25),
    ]]
    chamfer(chamfer1_edges, length=CHAMFER1_SIZE)


solid = part.part
